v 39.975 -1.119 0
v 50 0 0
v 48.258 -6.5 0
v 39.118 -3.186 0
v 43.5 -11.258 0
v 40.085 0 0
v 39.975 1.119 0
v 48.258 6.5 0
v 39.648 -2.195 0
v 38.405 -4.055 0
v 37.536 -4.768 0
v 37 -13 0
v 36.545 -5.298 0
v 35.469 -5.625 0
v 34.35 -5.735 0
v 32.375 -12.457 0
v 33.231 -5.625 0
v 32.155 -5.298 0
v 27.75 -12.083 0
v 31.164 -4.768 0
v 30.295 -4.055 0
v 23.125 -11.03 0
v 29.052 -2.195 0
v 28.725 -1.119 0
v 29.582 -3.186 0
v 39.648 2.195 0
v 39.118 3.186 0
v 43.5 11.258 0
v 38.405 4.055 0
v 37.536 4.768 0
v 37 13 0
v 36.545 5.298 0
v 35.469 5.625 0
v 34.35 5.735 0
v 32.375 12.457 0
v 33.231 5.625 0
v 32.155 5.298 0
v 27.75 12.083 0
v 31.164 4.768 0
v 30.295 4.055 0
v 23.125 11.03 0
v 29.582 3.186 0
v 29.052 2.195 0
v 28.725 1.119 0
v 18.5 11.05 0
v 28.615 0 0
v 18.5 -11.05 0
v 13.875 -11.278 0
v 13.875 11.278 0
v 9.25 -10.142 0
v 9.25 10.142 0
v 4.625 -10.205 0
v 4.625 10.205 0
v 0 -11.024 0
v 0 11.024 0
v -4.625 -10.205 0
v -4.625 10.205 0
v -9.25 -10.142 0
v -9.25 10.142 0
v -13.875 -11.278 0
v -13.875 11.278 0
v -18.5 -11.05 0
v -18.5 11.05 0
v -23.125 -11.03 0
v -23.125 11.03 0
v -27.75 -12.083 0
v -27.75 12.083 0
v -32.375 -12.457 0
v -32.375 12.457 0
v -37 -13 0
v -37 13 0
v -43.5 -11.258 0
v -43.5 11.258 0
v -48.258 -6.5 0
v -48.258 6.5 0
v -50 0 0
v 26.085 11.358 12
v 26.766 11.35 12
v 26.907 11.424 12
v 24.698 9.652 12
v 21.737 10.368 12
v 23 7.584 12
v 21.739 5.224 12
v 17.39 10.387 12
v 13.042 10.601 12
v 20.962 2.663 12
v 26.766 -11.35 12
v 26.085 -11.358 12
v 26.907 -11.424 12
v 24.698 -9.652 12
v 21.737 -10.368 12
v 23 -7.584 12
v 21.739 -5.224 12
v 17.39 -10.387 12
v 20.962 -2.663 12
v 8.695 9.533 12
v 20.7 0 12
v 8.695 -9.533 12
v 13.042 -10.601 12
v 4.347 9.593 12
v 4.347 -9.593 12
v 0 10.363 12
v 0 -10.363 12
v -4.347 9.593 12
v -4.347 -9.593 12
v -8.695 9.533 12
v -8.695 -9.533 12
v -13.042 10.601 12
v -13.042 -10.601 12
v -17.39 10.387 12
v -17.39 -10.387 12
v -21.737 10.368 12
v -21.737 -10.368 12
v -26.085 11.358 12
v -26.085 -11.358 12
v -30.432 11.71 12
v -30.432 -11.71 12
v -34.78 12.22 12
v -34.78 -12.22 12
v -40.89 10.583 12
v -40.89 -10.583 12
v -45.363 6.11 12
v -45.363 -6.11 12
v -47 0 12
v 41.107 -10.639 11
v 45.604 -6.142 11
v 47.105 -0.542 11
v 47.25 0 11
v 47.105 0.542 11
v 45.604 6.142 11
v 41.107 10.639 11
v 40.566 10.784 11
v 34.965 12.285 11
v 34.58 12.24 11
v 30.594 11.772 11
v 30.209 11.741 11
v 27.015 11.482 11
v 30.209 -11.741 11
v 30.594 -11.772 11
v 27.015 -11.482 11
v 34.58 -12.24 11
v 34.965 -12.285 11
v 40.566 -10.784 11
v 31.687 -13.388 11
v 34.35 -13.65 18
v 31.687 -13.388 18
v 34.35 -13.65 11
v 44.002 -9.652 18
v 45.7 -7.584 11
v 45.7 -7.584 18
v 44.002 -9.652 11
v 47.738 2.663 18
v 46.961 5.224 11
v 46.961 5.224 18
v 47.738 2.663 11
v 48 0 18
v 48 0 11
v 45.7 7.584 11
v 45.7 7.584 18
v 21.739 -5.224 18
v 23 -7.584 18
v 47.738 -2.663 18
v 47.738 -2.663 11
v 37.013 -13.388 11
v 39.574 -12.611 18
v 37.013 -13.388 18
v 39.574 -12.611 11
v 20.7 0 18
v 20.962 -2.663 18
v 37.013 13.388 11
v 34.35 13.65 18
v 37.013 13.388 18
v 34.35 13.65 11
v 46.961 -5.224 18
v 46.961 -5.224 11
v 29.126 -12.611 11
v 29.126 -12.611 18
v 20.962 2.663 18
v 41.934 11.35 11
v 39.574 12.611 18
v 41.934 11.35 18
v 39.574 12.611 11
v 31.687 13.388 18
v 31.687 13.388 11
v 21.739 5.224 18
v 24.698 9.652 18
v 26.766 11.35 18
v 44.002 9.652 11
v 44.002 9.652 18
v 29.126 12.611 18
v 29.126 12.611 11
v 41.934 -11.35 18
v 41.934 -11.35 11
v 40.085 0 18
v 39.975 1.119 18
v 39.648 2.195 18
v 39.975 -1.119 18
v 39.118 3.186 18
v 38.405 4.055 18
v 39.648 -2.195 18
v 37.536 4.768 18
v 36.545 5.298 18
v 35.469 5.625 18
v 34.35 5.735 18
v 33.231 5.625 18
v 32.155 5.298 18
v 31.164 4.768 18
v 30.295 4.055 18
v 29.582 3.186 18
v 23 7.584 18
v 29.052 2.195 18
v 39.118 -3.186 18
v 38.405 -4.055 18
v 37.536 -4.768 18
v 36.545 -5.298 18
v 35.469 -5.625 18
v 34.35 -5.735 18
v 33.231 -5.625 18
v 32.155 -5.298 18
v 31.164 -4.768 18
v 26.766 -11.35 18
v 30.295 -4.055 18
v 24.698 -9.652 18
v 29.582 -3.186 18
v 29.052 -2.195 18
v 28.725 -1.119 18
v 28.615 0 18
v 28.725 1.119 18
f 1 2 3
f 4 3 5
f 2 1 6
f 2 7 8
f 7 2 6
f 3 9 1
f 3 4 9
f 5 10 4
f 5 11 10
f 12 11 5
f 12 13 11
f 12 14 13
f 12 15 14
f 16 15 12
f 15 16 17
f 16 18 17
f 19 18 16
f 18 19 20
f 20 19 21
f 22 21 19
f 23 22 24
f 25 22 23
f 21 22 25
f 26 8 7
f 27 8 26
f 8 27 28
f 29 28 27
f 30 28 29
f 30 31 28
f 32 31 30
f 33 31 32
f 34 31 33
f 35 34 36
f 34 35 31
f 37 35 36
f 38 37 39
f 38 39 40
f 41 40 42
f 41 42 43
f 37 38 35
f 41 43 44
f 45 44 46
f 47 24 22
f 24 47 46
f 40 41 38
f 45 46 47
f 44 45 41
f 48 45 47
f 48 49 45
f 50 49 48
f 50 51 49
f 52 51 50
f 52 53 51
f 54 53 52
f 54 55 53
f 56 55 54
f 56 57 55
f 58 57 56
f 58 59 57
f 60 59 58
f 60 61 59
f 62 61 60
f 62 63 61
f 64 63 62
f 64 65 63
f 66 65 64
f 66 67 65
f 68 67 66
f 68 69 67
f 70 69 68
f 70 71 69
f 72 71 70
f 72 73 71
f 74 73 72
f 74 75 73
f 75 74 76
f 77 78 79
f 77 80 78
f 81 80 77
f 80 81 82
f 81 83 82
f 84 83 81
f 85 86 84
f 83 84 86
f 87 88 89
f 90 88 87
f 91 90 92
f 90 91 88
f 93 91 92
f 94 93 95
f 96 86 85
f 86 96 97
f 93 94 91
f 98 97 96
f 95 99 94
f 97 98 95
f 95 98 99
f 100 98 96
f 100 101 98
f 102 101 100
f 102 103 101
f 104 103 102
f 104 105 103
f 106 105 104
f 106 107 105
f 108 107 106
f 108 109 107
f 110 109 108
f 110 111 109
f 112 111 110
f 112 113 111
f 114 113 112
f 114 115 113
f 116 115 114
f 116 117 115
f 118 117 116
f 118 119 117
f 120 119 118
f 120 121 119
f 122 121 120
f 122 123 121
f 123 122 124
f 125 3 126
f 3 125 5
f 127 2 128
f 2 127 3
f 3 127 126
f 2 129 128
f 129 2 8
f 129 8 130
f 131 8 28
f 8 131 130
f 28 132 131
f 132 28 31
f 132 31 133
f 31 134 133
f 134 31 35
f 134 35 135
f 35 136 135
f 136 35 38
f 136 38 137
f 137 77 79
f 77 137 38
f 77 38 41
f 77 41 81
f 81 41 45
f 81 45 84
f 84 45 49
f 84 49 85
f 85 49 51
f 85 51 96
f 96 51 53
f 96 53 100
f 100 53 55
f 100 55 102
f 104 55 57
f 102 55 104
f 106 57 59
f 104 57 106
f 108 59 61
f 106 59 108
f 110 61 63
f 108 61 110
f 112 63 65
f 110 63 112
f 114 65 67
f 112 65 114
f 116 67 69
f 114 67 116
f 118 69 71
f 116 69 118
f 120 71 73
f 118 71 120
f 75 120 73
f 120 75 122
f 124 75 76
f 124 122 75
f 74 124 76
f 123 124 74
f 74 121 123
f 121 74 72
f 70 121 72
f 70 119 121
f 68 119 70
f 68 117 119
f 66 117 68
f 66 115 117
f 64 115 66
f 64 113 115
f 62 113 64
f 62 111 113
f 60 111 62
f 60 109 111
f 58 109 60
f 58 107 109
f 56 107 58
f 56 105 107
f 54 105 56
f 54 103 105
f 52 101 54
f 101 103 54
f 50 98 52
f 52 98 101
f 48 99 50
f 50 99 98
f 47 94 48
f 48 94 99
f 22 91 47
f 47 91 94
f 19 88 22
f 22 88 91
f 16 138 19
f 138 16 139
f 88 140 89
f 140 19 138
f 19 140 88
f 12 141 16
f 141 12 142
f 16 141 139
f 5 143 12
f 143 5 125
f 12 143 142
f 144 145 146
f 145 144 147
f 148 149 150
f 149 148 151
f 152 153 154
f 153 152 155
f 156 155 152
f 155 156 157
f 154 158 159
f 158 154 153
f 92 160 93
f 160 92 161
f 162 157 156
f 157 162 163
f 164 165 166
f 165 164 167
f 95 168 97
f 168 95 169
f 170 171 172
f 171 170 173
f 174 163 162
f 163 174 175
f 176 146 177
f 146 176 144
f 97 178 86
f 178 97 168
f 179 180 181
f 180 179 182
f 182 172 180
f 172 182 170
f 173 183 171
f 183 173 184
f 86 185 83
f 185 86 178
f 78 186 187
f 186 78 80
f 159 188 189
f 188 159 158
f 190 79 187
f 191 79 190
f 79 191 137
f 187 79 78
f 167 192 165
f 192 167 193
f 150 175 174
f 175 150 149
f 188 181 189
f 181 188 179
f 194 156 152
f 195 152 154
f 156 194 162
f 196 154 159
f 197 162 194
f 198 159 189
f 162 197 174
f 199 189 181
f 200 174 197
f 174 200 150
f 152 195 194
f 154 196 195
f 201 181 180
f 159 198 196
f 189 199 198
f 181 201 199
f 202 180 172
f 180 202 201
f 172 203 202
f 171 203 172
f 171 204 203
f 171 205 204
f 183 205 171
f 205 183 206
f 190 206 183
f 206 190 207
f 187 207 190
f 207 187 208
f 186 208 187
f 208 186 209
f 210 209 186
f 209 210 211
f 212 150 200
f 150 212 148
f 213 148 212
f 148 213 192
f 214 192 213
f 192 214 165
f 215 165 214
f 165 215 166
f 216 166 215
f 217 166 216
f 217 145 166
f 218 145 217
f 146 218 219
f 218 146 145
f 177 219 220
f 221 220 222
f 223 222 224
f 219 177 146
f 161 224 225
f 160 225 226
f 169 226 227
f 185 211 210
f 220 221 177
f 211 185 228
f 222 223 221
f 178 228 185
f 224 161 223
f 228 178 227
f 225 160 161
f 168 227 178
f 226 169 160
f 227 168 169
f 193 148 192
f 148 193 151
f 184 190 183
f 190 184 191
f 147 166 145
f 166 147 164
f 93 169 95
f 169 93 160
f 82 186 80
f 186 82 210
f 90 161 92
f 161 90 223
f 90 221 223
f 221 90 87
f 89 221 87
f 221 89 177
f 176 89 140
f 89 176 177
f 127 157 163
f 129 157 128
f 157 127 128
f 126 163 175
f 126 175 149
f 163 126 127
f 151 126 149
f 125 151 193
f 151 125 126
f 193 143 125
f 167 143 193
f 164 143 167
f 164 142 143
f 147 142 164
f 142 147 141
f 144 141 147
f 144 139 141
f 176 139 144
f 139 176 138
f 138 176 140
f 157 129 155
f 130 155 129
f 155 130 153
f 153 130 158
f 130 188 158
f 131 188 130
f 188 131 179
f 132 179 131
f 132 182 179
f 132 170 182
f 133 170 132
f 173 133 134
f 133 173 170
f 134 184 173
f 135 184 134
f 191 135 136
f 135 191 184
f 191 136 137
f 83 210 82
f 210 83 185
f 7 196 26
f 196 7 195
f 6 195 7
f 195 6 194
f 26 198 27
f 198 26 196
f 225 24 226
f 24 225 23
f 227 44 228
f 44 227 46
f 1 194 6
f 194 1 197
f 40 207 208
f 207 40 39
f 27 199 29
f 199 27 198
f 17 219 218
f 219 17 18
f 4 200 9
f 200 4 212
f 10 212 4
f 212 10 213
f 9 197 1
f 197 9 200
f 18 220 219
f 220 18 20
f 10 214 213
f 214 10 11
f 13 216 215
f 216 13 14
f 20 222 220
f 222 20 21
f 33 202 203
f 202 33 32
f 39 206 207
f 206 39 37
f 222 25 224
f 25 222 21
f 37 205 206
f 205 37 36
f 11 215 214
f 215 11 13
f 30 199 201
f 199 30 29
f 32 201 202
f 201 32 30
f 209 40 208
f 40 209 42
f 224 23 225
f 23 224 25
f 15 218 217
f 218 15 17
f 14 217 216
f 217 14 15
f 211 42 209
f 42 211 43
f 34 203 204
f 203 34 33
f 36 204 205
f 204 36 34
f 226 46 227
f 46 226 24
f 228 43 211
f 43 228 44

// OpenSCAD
$fn = 32;

// ----------------------------------------------------------------------
// Handle: 100 x 26 mm grip, 12 mm thick
// ----------------------------------------------------------------------

// --- parameters (mm) ---
length = 100;             // grip length
width = 26;               // grip width
thickness = 12;           // grip thickness
waist = 0.8;              // width factor at the middle
draft = 0.94;             // top face scale of the extrusion
scallops = 5;             // finger rests per side
ripple = 0.06;            // depth factor of the finger rests
boss_d = 27.3;            // mounting boss diameter
boss_h = 6;               // mounting boss height
boss_hole_d = 11.47;      // screw clearance through the boss
boss_r = 34.35;           // boss centre from the grip centre

/* ergonomic grip outline, closed spline-like polygon in the XY plane */
grip = [[-37, 13], [-32.375, 12.457], [-27.75, 12.083], [-23.125, 11.03], [-18.5, 11.05], [-13.875, 11.278], [-9.25, 10.142], [-4.625, 10.205], [0, 11.024], [4.625, 10.205], [9.25, 10.142], [13.875, 11.278], [18.5, 11.05], [23.125, 11.03], [27.75, 12.083], [32.375, 12.457], [37, 13], [43.5, 11.258], [48.258, 6.5], [50, 0], [48.258, -6.5], [43.5, -11.258], [37, -13], [37, -13], [32.375, -12.457], [27.75, -12.083], [23.125, -11.03], [18.5, -11.05], [13.875, -11.278], [9.25, -10.142], [4.625, -10.205], [0, -11.024], [-4.625, -10.205], [-9.25, -10.142], [-13.875, -11.278], [-18.5, -11.05], [-23.125, -11.03], [-27.75, -12.083], [-32.375, -12.457], [-37, -13], [-43.5, -11.258], [-48.258, -6.5], [-50, 0], [-48.258, 6.5], [-43.5, 11.258], [-37, 13]];

module grip_body() {
  linear_extrude(height = thickness, scale = draft) polygon(grip);
}

module boss_body() {
  /* sunk 1 mm into the grip so the joint overlaps */
  translate([boss_r, 0, thickness - 1]) cylinder(h = boss_h + 1, d = boss_d);
}

difference() {
  union() {
    grip_body();
    boss_body();
  }
  translate([boss_r, 0, -1]) cylinder(h = thickness + boss_h + 2, d = boss_hole_d);
}
